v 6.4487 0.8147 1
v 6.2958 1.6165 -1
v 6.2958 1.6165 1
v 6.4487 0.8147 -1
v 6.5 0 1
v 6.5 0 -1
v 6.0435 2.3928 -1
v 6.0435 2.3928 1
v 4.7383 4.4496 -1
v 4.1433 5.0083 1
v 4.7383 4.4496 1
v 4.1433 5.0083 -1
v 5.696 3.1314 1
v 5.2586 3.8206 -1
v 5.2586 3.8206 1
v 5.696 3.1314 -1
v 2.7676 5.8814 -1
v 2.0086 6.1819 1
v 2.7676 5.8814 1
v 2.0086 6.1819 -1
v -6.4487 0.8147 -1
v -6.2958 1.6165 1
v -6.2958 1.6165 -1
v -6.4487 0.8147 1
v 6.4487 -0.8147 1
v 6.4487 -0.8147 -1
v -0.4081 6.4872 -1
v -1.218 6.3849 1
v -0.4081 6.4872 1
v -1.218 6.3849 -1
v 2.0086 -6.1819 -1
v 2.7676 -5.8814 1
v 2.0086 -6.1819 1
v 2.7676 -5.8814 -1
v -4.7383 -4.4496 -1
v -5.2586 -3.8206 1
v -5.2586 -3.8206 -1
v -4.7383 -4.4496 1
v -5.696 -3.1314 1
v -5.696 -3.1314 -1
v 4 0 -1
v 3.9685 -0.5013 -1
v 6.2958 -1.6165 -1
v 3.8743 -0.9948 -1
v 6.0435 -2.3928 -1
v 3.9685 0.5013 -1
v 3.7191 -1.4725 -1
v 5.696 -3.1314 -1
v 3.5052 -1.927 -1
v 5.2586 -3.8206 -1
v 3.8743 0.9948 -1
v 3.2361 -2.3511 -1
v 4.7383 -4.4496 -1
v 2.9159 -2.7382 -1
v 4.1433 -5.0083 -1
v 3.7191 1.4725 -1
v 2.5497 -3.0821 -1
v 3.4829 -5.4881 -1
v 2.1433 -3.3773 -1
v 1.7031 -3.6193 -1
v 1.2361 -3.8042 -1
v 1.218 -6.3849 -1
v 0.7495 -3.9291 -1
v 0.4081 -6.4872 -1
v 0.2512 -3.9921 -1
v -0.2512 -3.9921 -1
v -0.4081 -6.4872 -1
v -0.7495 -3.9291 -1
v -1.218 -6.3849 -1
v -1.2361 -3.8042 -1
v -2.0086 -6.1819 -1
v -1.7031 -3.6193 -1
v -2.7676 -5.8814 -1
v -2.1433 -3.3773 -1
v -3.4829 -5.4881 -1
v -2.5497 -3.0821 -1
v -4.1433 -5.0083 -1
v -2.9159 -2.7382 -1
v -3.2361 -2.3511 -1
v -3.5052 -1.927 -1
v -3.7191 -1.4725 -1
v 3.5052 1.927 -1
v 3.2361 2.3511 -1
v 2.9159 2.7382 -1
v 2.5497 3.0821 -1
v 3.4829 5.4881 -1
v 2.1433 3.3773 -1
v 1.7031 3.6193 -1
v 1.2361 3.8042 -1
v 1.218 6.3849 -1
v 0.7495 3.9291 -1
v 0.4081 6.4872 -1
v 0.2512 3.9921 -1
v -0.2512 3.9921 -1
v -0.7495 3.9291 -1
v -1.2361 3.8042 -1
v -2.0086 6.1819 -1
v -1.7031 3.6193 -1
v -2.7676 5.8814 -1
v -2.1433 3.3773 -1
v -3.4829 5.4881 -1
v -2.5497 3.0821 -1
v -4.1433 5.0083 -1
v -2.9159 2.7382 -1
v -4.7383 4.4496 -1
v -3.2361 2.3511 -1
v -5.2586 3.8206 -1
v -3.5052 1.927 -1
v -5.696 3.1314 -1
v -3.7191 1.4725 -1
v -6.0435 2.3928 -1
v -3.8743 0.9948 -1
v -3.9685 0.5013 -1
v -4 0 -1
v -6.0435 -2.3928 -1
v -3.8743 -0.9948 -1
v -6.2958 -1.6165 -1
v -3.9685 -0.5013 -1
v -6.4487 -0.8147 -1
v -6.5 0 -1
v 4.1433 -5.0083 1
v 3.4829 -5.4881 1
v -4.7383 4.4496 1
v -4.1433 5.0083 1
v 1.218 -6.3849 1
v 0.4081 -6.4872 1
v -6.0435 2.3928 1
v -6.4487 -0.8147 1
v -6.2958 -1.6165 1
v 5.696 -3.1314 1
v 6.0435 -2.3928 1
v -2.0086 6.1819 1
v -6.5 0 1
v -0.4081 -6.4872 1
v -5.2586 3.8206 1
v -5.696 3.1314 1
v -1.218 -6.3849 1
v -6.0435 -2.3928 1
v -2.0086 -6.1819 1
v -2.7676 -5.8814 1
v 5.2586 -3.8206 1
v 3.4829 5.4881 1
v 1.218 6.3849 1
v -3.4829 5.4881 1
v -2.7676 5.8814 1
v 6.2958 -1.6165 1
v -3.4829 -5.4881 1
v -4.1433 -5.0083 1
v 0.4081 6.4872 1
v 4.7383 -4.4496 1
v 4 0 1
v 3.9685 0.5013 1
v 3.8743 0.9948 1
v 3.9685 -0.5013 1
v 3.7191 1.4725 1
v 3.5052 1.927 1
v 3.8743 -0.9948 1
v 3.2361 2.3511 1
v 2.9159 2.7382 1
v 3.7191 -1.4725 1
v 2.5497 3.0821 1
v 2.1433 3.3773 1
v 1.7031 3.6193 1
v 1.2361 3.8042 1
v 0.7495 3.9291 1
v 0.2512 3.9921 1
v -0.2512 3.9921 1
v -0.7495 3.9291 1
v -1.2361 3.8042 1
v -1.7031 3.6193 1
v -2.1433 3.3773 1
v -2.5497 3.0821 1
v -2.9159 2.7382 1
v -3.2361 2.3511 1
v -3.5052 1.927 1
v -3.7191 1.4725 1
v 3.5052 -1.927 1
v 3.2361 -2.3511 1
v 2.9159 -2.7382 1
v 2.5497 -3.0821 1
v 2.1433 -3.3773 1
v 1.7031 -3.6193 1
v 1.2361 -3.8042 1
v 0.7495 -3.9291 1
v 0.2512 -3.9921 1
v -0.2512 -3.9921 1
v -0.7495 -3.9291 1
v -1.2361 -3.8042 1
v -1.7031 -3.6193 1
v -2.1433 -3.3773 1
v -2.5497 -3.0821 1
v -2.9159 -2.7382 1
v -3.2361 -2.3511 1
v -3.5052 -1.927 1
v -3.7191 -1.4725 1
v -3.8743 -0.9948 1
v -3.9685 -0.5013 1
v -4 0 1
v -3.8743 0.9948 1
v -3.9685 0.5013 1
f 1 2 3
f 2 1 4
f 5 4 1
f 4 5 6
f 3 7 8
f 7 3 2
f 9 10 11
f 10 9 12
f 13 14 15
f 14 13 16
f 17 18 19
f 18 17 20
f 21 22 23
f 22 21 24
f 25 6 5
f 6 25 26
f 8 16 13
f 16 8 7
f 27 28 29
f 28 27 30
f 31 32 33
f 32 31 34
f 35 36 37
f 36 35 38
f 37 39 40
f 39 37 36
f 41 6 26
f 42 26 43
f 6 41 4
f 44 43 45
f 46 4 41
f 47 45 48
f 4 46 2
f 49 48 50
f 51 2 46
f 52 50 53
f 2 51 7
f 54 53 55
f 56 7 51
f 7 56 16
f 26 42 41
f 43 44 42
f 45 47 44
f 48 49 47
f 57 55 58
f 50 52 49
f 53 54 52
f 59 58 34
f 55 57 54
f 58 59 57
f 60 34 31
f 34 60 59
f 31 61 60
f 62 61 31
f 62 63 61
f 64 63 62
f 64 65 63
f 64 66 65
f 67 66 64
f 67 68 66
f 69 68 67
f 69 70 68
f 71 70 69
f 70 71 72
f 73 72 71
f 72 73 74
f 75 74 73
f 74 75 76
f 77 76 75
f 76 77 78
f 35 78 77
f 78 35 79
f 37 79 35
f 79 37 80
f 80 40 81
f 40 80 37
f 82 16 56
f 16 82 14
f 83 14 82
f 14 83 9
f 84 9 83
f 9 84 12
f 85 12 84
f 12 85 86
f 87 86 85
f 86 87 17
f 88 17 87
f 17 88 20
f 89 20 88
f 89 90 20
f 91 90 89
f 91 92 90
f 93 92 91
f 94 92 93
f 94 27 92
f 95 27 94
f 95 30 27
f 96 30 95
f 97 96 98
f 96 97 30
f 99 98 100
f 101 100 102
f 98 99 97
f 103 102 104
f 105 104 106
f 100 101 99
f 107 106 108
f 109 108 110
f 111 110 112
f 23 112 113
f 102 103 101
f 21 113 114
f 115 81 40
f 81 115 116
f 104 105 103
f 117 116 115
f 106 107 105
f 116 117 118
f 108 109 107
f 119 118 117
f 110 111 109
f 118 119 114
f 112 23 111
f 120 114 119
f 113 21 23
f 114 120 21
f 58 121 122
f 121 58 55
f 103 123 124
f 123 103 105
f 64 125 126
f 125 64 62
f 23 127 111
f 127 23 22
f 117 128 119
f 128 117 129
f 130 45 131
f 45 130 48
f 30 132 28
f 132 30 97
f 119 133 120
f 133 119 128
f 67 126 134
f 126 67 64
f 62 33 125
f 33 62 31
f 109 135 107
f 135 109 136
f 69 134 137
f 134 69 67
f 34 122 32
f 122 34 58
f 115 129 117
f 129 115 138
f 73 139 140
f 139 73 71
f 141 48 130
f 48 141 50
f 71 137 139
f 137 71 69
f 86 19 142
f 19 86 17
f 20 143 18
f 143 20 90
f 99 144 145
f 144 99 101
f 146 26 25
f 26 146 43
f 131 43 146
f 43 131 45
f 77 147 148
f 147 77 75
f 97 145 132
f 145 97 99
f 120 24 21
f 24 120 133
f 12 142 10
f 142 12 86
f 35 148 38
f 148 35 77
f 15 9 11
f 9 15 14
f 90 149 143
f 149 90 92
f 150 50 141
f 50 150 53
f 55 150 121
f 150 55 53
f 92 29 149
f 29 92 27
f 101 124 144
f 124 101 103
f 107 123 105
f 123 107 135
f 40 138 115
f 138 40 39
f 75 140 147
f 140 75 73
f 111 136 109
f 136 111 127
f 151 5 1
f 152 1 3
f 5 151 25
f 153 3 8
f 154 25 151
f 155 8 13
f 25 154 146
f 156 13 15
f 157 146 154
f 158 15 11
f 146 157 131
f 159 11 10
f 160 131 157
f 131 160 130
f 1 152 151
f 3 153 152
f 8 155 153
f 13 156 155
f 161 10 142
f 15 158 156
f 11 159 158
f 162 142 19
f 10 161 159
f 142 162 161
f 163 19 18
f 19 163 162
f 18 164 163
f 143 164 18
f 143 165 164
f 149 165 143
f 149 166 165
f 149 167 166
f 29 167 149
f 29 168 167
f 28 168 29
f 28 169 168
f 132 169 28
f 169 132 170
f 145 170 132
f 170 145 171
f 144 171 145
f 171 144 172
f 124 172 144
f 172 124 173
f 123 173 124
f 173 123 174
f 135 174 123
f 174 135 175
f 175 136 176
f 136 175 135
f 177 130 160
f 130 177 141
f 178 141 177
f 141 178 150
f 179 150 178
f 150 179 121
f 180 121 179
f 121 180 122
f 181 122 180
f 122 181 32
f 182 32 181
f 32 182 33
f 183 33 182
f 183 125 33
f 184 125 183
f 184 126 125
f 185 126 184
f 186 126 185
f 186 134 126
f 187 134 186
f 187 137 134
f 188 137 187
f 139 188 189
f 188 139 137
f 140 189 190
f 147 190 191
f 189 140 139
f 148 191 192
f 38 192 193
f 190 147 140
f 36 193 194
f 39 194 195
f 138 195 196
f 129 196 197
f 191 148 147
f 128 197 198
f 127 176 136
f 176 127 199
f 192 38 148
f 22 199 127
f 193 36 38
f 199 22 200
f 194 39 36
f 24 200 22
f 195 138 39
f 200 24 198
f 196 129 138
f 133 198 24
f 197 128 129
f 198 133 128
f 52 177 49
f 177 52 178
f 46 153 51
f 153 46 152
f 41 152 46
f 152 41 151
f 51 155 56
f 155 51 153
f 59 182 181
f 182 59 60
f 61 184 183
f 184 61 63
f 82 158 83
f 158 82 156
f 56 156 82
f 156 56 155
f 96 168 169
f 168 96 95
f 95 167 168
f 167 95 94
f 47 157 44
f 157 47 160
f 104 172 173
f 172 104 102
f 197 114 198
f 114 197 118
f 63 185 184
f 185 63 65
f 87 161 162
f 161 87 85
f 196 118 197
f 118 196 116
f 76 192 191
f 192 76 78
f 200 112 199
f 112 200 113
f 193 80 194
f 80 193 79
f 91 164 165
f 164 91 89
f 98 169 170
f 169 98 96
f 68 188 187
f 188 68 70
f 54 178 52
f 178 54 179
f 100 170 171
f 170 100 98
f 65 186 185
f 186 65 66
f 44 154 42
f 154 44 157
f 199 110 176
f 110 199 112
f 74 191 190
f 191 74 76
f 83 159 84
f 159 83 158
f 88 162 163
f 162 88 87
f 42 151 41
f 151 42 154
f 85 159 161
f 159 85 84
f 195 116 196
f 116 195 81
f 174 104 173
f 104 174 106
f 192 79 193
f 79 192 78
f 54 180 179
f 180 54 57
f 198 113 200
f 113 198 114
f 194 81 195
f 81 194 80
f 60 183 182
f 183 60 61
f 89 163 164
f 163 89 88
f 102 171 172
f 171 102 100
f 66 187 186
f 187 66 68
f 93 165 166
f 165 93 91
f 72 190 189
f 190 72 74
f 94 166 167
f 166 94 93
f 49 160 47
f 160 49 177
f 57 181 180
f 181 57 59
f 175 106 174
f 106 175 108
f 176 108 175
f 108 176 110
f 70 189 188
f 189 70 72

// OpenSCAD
$fn = 50;


difference() {
	union() {
		translate(v = [0, 0, -1.0000000000]) {
			cylinder(h = 2, r = 6.5000000000);
		}
	}
	union() {
		translate(v = [0, 0, -100.0000000000]) {
			cylinder(h = 200, r = 4.0000000000);
		}
	}
}
